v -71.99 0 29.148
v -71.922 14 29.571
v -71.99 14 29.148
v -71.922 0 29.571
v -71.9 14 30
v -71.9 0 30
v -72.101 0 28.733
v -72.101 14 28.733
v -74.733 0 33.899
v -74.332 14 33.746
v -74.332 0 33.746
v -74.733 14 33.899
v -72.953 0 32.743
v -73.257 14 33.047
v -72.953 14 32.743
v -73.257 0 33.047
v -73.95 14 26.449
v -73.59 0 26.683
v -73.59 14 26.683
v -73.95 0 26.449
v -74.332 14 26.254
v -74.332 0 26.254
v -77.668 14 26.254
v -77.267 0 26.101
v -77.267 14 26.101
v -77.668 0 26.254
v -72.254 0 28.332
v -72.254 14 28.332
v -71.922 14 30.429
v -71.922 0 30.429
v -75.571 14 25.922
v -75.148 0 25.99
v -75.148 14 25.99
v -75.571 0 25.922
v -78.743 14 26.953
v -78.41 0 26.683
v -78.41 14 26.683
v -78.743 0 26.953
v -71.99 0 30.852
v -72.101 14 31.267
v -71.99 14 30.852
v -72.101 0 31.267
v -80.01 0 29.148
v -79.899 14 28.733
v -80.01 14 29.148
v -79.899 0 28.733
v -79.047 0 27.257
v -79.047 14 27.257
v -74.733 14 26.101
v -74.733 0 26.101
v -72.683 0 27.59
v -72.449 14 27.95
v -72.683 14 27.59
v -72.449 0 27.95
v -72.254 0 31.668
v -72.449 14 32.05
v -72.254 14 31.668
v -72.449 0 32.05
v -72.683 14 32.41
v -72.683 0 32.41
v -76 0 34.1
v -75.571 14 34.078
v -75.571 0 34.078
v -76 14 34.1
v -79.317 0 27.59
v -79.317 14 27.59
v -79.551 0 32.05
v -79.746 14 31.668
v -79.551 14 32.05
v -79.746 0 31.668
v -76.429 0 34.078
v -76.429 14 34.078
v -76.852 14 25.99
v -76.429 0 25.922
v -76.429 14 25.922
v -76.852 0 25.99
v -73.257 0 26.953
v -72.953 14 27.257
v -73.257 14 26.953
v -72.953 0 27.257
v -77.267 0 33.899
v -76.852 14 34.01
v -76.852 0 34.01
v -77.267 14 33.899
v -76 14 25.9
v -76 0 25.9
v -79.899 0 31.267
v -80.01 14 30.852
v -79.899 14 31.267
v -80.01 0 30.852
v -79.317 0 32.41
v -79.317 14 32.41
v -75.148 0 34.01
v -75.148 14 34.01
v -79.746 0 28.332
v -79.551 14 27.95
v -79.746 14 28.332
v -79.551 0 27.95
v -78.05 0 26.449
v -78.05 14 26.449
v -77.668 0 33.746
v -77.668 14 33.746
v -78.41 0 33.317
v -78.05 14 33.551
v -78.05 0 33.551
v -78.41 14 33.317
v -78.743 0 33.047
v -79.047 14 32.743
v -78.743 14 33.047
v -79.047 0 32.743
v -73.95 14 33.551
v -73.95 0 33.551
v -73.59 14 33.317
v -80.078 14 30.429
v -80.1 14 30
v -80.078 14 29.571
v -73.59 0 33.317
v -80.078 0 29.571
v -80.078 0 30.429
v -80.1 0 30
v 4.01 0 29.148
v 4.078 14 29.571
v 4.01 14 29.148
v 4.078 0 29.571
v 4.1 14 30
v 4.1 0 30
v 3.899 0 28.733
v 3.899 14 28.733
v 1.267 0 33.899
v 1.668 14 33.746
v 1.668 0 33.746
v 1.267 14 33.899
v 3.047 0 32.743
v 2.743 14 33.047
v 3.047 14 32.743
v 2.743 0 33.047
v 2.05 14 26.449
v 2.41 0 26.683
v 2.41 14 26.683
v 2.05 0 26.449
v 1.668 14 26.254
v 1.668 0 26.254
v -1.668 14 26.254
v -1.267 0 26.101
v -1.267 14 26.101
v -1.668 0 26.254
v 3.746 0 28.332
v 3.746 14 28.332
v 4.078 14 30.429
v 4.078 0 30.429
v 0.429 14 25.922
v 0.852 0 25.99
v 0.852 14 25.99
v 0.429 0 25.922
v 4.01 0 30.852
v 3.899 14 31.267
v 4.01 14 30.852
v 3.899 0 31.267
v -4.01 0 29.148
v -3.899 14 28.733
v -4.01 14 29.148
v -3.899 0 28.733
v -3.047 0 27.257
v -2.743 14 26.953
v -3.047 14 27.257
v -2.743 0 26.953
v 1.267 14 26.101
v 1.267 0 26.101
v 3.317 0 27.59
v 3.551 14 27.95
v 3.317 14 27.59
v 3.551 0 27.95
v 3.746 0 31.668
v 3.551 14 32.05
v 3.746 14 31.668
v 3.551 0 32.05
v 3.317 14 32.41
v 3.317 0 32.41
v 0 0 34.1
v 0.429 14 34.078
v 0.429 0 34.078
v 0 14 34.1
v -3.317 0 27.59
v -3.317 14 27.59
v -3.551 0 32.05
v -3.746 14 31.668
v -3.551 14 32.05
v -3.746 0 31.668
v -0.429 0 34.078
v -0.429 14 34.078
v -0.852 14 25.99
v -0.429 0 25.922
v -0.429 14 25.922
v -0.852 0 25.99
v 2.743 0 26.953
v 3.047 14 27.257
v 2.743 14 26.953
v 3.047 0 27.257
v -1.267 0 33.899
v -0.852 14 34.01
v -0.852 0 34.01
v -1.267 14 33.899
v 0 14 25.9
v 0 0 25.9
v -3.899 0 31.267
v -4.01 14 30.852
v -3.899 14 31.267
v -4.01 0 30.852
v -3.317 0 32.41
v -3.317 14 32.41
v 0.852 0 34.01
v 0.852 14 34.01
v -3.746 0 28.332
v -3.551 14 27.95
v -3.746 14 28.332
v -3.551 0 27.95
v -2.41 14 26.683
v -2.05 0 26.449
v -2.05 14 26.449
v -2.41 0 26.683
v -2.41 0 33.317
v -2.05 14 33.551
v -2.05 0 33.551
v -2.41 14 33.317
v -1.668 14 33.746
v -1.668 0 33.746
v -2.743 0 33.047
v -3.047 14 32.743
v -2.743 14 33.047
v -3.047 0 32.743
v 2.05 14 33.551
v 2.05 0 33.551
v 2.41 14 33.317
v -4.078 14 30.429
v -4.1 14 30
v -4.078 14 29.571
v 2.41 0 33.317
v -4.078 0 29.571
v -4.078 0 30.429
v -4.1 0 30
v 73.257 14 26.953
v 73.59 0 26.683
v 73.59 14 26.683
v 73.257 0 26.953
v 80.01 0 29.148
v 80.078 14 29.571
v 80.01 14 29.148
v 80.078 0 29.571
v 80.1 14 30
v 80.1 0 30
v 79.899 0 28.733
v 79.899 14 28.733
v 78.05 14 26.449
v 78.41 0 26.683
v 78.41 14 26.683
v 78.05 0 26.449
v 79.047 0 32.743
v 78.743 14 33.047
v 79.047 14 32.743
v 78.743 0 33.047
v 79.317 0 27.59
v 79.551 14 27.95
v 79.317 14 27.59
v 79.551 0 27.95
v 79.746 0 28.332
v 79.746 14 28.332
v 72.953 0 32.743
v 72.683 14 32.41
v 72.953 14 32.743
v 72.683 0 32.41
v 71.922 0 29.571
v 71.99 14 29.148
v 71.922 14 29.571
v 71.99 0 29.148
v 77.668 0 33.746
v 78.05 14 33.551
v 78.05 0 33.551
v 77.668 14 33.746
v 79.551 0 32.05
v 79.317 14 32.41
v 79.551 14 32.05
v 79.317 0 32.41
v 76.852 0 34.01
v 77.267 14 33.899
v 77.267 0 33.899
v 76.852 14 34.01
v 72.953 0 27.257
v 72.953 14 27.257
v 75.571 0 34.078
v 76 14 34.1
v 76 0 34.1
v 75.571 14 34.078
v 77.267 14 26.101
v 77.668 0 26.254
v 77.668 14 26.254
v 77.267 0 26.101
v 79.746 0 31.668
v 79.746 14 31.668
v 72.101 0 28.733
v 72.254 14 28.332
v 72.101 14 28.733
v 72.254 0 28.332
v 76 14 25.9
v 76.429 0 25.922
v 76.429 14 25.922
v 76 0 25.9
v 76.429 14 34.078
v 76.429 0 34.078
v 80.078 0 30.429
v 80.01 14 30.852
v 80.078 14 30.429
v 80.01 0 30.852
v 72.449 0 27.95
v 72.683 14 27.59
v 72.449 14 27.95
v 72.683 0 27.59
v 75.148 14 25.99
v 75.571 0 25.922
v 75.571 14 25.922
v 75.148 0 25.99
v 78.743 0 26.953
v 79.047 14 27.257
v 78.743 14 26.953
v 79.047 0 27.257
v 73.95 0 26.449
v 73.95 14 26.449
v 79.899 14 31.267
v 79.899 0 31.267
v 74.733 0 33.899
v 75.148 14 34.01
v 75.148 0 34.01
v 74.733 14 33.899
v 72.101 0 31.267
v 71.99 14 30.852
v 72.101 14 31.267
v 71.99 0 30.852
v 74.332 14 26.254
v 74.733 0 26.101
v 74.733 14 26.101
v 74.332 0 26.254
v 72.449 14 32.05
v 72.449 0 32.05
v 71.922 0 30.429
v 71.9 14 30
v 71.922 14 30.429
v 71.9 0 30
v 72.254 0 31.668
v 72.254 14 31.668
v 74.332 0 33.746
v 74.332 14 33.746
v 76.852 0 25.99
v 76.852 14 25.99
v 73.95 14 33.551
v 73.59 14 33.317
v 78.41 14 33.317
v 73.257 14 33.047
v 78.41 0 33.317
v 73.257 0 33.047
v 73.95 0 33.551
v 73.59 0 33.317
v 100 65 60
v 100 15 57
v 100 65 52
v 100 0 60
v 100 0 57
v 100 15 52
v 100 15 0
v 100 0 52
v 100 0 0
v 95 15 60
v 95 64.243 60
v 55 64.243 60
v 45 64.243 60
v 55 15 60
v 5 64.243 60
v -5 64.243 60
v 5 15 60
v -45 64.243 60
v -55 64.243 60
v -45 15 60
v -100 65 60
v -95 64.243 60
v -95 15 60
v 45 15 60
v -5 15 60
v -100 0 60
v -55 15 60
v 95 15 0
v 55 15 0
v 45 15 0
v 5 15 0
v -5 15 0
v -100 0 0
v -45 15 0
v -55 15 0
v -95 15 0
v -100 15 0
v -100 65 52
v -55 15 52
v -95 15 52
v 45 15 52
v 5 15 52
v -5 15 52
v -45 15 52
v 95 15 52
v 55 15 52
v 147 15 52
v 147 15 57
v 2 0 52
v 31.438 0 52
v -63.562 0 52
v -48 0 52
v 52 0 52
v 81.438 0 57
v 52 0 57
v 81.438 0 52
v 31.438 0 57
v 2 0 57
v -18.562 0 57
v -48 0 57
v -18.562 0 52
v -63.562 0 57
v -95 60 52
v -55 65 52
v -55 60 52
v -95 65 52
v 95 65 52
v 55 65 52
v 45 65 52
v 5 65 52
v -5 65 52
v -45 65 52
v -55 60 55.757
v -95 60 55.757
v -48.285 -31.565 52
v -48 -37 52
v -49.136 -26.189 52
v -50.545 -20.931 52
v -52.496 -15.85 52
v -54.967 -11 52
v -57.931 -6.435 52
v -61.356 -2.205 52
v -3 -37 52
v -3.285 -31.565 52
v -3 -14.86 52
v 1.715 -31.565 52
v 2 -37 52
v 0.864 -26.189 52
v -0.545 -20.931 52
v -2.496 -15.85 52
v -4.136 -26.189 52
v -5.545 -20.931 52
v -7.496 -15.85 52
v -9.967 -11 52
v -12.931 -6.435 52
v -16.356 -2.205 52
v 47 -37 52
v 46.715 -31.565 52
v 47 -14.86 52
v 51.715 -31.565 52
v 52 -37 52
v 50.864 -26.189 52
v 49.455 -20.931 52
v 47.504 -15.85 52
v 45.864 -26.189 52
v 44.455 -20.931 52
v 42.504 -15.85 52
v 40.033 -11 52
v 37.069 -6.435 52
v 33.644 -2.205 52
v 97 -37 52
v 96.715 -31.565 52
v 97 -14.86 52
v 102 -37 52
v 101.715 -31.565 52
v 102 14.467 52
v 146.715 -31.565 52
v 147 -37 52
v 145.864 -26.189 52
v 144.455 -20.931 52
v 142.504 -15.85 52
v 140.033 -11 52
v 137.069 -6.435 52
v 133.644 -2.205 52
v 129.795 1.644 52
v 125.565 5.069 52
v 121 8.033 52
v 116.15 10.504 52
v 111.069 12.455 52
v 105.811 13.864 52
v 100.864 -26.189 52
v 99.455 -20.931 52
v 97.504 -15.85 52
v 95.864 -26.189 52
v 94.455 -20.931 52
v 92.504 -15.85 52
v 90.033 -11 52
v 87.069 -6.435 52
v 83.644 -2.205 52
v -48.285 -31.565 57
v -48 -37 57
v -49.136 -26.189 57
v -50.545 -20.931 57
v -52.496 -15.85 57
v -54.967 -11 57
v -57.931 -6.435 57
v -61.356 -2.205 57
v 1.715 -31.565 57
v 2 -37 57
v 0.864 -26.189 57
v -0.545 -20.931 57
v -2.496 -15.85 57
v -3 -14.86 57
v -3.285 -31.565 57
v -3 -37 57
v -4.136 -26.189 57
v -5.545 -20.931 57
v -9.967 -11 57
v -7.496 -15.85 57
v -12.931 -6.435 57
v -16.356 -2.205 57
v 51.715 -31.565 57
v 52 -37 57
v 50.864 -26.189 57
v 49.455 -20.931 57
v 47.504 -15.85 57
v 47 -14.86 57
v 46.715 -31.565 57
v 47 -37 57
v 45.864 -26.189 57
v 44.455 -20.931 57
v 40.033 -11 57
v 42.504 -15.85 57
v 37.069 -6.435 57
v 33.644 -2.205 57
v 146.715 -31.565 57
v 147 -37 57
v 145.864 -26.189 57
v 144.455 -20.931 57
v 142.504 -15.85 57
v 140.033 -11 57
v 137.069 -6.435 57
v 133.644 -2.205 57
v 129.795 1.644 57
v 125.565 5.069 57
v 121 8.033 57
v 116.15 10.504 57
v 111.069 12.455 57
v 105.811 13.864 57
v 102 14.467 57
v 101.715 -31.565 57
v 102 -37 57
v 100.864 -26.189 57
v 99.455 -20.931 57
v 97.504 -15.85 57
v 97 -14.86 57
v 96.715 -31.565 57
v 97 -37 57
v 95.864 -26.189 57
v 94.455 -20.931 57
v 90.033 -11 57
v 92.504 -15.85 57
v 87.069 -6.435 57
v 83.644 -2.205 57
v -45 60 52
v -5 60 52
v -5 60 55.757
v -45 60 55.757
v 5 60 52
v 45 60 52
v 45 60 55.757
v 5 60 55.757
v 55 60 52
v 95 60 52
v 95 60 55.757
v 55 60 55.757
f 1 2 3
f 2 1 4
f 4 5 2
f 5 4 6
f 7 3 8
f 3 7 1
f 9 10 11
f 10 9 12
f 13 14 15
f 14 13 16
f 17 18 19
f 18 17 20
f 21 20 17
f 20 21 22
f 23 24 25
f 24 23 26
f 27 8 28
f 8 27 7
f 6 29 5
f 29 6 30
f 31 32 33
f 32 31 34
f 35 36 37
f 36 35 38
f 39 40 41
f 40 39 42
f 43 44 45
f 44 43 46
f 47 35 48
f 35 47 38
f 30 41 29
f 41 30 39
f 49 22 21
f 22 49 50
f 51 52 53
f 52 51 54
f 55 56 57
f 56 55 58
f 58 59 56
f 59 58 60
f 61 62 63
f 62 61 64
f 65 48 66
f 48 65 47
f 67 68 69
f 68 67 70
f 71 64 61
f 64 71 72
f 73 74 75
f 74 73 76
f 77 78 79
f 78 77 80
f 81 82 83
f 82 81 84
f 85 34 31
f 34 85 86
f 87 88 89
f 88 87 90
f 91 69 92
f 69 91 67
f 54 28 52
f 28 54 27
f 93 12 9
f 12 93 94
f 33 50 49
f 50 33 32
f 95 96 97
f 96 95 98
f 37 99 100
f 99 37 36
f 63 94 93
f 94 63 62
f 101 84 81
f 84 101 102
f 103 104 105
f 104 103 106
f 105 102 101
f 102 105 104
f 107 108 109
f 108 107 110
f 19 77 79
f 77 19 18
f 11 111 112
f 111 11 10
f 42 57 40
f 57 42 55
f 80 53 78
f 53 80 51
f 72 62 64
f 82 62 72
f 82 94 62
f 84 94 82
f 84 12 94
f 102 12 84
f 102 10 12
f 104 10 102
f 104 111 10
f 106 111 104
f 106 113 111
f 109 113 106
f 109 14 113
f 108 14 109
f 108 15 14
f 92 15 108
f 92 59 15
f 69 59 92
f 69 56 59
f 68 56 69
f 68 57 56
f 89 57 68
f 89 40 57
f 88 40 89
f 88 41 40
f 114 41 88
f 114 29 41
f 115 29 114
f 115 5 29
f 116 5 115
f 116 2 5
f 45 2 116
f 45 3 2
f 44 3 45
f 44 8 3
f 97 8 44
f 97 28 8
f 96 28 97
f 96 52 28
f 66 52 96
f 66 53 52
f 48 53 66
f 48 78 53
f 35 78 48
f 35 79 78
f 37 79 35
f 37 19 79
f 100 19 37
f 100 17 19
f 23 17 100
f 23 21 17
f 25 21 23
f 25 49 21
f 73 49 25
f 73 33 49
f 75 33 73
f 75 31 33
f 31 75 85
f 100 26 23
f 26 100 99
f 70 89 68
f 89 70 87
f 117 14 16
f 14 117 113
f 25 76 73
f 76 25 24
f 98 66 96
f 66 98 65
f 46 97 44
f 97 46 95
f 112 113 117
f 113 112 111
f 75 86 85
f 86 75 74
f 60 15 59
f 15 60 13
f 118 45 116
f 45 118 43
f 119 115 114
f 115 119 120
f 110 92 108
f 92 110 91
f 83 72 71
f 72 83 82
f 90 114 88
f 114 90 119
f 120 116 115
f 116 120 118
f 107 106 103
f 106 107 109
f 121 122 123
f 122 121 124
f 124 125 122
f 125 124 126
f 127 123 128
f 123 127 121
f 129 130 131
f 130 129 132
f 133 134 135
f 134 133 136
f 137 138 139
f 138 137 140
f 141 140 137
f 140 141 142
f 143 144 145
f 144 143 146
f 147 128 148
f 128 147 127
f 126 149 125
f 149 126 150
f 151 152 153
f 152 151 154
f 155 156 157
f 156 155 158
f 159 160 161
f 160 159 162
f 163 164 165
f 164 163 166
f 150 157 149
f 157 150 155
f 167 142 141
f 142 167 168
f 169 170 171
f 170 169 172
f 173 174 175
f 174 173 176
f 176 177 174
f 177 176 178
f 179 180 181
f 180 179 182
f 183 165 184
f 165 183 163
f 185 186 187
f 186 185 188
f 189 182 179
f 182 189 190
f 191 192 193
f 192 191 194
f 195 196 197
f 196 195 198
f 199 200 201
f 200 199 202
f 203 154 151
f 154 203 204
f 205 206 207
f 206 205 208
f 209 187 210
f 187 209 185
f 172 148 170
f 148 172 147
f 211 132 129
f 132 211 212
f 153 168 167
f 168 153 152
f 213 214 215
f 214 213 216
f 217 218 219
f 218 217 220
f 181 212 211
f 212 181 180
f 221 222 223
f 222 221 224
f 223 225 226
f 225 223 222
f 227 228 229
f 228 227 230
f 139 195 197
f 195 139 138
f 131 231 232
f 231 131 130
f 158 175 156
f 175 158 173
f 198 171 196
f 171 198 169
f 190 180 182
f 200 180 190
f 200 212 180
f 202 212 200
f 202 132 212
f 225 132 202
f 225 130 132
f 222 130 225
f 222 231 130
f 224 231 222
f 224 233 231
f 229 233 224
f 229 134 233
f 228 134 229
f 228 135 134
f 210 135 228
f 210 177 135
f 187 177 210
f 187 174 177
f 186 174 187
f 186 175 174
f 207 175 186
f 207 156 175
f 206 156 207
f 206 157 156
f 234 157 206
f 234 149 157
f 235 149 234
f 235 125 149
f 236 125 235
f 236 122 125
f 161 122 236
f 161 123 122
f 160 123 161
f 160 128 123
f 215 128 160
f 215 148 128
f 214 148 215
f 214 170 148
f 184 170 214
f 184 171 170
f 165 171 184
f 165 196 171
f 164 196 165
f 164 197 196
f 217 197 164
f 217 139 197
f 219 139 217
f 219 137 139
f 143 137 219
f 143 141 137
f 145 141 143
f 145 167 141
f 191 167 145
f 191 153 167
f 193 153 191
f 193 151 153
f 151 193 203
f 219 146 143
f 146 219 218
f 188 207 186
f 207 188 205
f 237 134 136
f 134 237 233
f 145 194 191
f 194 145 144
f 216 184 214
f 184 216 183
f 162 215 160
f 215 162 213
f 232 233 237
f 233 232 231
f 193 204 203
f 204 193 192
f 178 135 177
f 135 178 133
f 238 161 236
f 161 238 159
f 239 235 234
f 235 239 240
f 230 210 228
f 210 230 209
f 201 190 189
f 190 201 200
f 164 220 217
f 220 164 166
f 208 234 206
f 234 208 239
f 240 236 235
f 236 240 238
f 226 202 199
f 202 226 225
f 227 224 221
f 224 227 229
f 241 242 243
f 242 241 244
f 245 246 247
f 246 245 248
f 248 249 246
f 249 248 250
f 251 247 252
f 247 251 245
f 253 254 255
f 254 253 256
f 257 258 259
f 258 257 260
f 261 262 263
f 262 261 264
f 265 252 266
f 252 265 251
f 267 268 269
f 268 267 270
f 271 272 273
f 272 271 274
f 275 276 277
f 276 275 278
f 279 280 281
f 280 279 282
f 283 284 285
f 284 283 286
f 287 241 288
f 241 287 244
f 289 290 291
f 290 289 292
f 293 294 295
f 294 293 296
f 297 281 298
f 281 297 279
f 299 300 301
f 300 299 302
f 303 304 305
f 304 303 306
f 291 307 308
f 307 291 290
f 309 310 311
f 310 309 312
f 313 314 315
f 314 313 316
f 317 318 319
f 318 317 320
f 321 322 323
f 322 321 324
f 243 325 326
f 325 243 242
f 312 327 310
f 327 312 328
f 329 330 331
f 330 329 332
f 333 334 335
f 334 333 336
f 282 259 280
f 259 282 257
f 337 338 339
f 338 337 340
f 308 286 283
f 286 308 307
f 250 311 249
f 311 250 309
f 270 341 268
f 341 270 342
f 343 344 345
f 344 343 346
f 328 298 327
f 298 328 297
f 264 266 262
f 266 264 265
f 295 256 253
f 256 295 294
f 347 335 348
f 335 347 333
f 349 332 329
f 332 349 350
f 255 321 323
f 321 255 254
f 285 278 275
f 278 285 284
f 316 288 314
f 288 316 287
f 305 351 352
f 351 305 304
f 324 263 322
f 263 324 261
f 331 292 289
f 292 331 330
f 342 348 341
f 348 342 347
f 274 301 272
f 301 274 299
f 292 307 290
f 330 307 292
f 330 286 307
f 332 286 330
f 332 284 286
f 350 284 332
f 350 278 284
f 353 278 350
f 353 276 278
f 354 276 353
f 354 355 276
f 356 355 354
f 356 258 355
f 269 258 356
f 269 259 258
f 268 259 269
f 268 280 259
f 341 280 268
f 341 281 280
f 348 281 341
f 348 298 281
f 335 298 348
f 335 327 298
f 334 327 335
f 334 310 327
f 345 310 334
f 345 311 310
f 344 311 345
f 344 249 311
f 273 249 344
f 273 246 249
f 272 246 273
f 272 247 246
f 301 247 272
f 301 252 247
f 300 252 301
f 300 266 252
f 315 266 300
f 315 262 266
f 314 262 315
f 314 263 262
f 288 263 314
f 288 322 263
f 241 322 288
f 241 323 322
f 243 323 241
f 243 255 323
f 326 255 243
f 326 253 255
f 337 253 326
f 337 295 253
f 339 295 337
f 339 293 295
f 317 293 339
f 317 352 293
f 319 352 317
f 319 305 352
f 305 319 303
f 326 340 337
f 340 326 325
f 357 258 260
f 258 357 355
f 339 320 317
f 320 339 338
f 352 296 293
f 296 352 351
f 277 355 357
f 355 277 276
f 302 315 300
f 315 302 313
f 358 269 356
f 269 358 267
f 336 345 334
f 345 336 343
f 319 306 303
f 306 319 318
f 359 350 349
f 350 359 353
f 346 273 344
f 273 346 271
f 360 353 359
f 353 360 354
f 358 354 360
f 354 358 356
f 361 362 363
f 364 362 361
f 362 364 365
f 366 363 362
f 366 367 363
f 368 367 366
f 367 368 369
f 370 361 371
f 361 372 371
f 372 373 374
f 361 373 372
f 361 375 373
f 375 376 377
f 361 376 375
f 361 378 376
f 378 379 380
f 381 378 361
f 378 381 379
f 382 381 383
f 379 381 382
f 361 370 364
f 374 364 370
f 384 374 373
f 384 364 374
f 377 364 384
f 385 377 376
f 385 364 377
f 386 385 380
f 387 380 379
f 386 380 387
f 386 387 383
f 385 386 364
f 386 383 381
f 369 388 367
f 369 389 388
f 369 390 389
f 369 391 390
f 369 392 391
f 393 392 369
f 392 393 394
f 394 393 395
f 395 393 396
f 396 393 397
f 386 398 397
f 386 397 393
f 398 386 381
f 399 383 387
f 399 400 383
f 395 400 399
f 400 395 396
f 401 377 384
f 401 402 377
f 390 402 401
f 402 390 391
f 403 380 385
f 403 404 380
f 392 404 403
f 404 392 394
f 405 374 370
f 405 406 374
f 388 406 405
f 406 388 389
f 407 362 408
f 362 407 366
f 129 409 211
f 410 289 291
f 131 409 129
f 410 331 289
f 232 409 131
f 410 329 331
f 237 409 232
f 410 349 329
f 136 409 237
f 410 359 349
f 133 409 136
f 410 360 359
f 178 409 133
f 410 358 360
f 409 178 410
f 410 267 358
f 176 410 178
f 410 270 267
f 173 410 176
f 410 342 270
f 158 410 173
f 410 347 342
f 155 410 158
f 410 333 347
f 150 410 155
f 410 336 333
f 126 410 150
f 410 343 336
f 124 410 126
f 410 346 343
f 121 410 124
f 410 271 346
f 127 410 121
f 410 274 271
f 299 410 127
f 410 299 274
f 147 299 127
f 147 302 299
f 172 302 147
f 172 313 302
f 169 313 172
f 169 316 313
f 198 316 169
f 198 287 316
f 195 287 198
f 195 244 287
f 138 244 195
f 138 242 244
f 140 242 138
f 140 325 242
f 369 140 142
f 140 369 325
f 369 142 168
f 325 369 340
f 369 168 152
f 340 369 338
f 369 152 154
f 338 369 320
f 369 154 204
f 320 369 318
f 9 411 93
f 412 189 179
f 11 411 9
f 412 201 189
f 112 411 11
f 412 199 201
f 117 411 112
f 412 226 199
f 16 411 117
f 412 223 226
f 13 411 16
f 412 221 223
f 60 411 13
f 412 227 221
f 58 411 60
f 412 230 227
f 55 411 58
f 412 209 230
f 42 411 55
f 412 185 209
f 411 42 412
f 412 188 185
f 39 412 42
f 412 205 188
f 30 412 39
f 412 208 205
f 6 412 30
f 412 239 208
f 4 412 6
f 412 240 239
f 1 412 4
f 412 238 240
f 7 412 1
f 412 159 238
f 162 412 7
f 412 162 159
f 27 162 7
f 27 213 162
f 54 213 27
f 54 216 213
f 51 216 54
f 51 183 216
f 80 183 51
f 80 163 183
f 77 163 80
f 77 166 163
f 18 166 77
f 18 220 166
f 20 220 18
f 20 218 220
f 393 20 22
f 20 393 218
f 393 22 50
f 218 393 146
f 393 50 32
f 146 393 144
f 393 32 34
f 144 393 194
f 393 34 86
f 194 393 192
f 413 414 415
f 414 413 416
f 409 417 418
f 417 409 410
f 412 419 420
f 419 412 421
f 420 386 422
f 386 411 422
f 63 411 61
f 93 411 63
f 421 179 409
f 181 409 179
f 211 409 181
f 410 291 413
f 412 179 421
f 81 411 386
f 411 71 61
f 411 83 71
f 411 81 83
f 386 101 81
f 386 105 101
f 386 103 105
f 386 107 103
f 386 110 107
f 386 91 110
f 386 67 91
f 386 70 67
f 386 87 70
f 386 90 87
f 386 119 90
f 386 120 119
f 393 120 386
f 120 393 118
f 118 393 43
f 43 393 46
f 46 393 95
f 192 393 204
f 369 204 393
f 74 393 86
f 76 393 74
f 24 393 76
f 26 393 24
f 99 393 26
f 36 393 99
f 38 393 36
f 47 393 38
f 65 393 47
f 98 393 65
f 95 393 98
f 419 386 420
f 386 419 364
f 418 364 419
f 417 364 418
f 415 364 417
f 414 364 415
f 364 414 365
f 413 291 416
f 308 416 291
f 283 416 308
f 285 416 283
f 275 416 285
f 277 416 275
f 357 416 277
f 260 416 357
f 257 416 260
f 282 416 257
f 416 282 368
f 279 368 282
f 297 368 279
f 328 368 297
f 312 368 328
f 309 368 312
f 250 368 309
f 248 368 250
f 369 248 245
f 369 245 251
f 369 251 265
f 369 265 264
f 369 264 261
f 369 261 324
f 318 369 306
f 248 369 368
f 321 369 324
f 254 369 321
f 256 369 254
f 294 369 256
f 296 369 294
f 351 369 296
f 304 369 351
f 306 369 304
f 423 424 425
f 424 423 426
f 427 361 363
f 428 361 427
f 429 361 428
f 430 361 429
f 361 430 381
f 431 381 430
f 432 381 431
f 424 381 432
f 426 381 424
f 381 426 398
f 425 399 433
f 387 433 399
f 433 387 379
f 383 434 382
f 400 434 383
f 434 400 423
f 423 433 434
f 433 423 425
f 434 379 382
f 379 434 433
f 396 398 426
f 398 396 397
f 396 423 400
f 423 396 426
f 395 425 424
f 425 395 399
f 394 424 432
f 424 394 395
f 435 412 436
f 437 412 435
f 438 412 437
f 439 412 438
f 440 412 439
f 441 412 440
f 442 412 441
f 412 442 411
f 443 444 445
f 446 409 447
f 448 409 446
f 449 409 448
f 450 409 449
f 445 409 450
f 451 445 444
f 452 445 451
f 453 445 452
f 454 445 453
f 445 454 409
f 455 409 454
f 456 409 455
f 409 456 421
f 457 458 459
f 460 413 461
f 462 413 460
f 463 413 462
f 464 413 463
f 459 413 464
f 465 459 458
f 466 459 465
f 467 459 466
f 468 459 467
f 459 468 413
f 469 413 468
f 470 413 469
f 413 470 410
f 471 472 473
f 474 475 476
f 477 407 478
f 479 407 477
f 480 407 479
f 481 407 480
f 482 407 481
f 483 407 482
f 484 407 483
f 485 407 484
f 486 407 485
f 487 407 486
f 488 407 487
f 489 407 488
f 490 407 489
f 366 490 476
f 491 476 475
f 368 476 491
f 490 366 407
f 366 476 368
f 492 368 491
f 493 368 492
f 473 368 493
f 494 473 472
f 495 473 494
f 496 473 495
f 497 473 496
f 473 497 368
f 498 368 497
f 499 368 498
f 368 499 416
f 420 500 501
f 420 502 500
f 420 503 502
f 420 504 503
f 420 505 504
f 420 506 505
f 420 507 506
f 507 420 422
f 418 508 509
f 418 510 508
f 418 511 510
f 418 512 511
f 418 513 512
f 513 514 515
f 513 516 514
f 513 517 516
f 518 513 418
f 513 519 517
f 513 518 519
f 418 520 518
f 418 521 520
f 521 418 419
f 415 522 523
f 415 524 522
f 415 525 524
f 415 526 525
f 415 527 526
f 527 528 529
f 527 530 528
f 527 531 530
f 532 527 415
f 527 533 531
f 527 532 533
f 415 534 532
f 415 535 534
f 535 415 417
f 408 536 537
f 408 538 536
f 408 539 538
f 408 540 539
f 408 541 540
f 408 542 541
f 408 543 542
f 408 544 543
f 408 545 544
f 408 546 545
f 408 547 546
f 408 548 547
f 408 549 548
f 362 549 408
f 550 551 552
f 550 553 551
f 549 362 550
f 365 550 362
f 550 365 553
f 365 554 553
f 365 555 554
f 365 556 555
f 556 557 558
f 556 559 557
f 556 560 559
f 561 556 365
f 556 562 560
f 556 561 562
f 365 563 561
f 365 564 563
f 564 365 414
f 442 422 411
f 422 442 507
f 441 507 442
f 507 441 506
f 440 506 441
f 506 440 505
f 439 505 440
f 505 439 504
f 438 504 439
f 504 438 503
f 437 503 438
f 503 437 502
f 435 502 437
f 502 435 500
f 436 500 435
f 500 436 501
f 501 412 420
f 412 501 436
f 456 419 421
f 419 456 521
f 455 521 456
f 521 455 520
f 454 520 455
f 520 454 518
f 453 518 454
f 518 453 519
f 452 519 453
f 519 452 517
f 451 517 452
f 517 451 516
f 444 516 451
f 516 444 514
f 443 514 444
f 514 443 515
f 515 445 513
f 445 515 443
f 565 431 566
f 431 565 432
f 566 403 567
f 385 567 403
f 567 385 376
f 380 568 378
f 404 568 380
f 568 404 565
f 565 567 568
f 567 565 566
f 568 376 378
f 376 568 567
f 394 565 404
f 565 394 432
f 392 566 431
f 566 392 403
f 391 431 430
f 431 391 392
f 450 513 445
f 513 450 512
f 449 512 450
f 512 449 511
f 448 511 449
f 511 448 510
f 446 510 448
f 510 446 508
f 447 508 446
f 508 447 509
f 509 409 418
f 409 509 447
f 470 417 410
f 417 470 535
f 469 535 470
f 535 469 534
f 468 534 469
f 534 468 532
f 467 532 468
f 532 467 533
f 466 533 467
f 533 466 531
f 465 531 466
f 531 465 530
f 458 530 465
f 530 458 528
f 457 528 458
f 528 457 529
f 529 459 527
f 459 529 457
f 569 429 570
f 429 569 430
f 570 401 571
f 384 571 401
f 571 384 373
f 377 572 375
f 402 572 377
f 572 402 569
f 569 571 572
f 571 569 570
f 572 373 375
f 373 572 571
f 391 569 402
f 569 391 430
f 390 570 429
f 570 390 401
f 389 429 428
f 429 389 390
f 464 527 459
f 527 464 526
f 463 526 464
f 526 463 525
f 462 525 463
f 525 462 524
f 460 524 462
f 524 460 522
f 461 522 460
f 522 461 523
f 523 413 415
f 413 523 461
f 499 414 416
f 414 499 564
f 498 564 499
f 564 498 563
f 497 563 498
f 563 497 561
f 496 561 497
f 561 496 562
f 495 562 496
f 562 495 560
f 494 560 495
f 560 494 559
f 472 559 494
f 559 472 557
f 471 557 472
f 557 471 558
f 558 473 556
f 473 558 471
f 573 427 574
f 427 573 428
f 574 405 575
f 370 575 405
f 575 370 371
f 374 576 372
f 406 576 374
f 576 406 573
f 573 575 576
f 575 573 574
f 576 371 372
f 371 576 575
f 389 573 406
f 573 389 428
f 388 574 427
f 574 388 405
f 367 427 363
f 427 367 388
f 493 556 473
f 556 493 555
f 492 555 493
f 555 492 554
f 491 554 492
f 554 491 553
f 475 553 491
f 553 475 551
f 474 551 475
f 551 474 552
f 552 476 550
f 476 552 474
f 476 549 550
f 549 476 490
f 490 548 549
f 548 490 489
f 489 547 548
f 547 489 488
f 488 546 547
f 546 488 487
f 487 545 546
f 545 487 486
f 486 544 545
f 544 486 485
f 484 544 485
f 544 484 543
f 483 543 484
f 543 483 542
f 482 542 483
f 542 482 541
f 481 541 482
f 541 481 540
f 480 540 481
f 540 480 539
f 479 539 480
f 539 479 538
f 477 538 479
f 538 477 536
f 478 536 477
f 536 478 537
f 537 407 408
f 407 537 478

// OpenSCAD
// --- Parameter ---
platte_breite = 200;
platte_hoehe = 60;
platte_tiefe = 15; 

pin_d = 8.2;
pin_loch_tiefe = 13;  

flasche_innen = 40;   
flasche_hoehe = 8;    
flasche_aussen = flasche_innen + 10; 

anzahl_halter = 4; 
lochabstand_einheit = 38; 
anzahl_loecher = 3; 
rand_puffer = 4; 

$fn = 60; 

// --- Berechnungen ---
gesamtbreite_halter = anzahl_halter * flasche_aussen;
start_x_halter = -gesamtbreite_halter / 2;

module montageplatte() {
    nutzbare_breite = platte_breite - (2 * rand_puffer);
    max_schritte = floor(nutzbare_breite / lochabstand_einheit);
    max_loecher = max_schritte + 1;
    loecher = min(anzahl_loecher, max_loecher);
    
    spannweite = max_schritte * lochabstand_einheit;
    
    difference() {
        // Grundplatte
        translate([-platte_breite/2, 0, 0])
            cube([platte_breite, platte_tiefe, platte_hoehe]);
        
        // Loch-Logik
        if (loecher > 1) {
            schritt_weite = floor(max_schritte / (loecher - 1)) * lochabstand_einheit;
            zentrierte_spannweite = (loecher - 1) * schritt_weite;
            for(i = [0 : loecher - 1]) {
                translate([-(zentrierte_spannweite/2) + i * schritt_weite, -1, platte_hoehe / 2])
                    rotate([-90, 0, 0])
                    cylinder(h = pin_loch_tiefe + 2, d = pin_d);
            }
        } else {
            translate([0, -1, platte_hoehe / 2])
                rotate([-90, 0, 0])
                cylinder(h = pin_loch_tiefe + 2, d = pin_d);
        }
    }
}

module flaschenhalter(x_pos) {
    stuetzen_dicke = 5;
    stuetzen_hoehe = platte_hoehe - flasche_hoehe; 
    stuetzen_tiefe = flasche_aussen; 
    z_arm = platte_hoehe - flasche_hoehe; 
    r_stuetze = platte_hoehe - flasche_hoehe; // Radius der Rundung

    union() {
        difference() {
            // Grundkörper Arm
            translate([x_pos, platte_tiefe, z_arm])
                cube([flasche_aussen, flasche_aussen, flasche_hoehe]);
            
            // Der Drop-In Schlitz (geschlossenes Loch)
            // Wir lassen hinten 5mm Platz zur Wand für mehr Stabilität
            translate([x_pos + (flasche_aussen - flasche_innen) / 2, platte_tiefe, z_arm - 1])
                cube([flasche_innen, flasche_innen+5, flasche_hoehe + 2]);
            
            // KORREKTUR: Fase an der belasteten Vorderkante des Ausschnitts
            // Die Kante liegt bei Y = platte_tiefe + 5 (Versatz) + flasche_innen
            translate([x_pos + flasche_aussen/2, platte_tiefe + 5 + flasche_innen, z_arm + flasche_hoehe])
                rotate([45, 0, 0])
                cube([flasche_innen, 6, 6], center=true);
        }

        // Stützen von unten (statisch optimal für Drop-In)
        for(off = [0, flasche_aussen - stuetzen_dicke]) {
            translate([x_pos + off, platte_tiefe, z_arm])
                rotate([90, 0, 90])
                linear_extrude(height = stuetzen_dicke)
                    polygon(points = [[0,0], [stuetzen_tiefe, 0], [0, -stuetzen_hoehe]]);
        }
        
        for(off = [0, flasche_aussen - stuetzen_dicke]) {
            translate([x_pos + off, platte_tiefe, z_arm])
                rotate([0, 00, 180])
                linear_extrude(height = stuetzen_dicke)
                    difference() {
                        // Ein Quadrat als Basis
                        translate([-r_stuetze, 0])
                            square([r_stuetze, r_stuetze]);
                        // Ein Kreis, der die Rundung herausschneidet (konkav)
                        translate([0, r_stuetze])
                            circle(r = r_stuetze);
                    }
        }
    }
}

// --- Render ---
montageplatte();
for(i = [0 : anzahl_halter - 1]) {
    flaschenhalter(start_x_halter + i * flasche_aussen);
}
